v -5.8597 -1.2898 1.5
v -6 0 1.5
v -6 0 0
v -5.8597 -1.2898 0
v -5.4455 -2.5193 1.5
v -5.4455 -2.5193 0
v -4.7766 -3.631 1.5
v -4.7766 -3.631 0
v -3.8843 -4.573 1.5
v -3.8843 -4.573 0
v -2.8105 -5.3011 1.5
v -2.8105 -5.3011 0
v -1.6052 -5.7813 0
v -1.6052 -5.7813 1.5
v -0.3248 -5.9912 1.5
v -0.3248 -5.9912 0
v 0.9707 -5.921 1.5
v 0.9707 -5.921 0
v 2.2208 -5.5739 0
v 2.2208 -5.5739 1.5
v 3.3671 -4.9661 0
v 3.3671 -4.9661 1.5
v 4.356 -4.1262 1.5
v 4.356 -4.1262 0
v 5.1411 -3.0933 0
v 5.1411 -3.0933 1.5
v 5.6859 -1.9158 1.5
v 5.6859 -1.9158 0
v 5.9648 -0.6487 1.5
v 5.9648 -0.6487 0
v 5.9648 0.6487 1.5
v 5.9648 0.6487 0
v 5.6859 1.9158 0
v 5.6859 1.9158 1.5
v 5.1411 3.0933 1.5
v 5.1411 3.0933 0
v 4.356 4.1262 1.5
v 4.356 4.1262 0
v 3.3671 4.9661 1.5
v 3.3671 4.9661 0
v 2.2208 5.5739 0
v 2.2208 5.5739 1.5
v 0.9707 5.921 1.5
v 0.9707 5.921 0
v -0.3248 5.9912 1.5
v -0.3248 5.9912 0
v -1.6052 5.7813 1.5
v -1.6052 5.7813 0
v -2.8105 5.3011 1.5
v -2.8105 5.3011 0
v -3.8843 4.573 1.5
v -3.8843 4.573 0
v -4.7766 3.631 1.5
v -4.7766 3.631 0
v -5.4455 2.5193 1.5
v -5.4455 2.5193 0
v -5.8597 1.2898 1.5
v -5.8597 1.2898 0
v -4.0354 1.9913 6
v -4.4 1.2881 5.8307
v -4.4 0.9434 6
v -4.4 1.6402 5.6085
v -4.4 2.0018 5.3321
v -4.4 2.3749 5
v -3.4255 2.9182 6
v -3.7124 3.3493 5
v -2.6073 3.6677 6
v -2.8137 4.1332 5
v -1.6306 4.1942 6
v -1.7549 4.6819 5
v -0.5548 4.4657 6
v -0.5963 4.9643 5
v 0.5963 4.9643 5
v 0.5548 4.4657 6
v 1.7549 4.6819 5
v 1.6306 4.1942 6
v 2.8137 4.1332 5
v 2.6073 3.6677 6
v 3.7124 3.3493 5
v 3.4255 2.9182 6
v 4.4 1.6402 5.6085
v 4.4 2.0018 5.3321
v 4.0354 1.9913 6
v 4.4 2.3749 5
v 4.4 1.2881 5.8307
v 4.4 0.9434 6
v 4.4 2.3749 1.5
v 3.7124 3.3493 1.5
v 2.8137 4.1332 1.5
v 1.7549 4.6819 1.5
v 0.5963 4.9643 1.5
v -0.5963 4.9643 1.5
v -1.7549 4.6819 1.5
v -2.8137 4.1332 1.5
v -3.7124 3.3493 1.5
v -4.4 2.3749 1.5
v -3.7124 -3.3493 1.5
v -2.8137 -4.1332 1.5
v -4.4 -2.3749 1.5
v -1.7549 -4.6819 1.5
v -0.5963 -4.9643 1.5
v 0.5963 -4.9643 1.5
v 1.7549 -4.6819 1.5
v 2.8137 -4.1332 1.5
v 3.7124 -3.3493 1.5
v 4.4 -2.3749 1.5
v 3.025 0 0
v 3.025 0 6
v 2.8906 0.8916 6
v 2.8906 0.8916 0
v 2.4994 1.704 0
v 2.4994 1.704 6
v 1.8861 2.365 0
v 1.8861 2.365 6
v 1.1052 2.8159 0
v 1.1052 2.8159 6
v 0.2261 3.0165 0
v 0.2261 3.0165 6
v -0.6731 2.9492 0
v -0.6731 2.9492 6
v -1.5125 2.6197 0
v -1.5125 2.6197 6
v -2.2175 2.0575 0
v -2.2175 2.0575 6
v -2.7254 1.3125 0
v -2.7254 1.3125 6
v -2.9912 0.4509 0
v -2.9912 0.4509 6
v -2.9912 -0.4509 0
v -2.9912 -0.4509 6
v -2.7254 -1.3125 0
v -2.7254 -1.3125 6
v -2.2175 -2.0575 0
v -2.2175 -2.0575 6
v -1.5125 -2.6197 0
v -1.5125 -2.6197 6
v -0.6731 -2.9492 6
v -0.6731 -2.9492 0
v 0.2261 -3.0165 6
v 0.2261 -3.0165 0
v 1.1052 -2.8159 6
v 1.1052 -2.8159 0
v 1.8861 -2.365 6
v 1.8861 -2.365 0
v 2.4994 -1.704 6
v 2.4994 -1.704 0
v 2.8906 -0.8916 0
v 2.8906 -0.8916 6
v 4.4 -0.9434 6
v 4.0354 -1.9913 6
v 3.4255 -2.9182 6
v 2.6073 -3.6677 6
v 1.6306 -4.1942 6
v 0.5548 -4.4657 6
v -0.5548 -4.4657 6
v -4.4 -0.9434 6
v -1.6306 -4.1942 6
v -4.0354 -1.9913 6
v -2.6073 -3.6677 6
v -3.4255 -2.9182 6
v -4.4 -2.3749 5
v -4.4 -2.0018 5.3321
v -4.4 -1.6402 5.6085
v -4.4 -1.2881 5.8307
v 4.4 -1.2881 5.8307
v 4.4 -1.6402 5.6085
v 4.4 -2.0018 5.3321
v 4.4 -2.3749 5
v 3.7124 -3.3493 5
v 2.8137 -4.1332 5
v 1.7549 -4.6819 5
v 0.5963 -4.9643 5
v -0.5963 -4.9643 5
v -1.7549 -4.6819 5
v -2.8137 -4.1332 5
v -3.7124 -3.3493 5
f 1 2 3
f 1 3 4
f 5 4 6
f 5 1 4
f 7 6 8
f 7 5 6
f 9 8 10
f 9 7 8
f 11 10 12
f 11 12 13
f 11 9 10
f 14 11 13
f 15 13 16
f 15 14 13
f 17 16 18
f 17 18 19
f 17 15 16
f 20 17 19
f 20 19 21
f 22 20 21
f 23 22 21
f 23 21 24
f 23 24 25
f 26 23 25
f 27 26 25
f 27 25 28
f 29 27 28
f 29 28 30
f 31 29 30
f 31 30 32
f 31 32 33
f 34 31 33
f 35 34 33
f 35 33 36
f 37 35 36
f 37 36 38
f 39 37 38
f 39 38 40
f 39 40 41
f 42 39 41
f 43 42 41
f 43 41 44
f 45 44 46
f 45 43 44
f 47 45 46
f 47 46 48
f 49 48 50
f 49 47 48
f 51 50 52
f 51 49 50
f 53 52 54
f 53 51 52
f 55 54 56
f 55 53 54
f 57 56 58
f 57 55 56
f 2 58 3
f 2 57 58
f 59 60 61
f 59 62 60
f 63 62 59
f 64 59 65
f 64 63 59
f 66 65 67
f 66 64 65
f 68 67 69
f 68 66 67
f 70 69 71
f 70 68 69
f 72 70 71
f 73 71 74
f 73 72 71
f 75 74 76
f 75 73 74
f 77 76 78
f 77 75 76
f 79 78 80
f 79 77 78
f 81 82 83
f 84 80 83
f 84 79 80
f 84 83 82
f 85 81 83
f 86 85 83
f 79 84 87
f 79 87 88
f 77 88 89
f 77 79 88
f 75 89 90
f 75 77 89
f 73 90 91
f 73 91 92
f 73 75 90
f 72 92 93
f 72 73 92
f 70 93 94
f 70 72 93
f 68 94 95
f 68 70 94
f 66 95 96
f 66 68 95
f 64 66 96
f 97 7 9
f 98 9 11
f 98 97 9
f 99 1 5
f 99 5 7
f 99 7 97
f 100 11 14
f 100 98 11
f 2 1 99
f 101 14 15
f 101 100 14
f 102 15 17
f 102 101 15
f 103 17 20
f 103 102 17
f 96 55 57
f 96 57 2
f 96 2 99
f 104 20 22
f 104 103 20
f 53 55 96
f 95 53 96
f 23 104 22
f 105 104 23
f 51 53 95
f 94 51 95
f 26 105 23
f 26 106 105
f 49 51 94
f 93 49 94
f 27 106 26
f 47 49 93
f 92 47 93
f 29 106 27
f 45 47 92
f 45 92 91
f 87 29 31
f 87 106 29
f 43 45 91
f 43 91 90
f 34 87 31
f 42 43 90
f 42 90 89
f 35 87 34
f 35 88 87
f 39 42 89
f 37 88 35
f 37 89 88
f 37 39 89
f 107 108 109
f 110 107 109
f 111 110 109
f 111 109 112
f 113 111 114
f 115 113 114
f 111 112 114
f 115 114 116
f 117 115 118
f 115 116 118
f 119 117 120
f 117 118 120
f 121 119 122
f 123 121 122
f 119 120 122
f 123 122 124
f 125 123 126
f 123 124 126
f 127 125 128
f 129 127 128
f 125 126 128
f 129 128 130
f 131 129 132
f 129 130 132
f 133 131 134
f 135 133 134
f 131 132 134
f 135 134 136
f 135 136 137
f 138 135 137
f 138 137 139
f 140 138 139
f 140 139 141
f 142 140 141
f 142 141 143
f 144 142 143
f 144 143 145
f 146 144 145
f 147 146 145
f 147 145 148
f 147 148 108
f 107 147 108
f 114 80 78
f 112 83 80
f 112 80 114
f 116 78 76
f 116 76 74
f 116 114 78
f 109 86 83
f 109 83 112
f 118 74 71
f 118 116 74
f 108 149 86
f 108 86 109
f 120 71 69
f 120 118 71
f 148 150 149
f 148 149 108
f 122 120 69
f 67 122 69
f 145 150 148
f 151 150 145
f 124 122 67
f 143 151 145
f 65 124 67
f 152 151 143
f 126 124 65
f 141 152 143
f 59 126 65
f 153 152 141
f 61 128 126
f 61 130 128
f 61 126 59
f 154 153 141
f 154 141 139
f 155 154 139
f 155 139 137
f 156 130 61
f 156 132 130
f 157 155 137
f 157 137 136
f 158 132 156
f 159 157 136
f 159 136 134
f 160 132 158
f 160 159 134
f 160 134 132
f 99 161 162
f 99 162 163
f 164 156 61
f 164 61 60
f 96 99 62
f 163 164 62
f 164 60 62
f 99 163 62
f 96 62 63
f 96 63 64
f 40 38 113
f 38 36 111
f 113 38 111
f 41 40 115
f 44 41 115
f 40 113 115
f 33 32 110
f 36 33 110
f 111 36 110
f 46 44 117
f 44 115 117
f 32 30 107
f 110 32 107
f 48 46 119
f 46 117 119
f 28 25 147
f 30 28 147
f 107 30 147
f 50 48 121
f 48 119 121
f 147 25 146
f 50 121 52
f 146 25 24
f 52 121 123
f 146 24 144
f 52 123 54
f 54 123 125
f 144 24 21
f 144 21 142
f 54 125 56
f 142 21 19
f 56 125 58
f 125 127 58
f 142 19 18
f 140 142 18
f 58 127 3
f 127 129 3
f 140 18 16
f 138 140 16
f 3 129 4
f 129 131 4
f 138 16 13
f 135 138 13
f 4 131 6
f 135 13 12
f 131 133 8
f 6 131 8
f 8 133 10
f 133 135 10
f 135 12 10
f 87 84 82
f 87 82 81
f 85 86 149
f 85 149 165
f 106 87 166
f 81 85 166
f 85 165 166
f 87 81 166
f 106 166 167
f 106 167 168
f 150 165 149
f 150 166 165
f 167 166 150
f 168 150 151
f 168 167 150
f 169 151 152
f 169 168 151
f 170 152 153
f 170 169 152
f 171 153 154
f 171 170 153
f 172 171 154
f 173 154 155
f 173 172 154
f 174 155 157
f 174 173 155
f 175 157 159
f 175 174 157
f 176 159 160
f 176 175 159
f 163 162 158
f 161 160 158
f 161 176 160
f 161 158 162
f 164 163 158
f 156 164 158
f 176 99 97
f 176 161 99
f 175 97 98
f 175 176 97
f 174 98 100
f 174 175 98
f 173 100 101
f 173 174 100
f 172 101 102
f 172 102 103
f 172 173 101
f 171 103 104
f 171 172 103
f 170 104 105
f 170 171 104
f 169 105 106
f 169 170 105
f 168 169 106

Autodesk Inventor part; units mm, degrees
ref_plane "YZ Plane" through (0, 0, 0) normal (1, 0, 0) x (0, 1, 0)
ref_plane "XZ Plane" through (0, 0, 0) normal (0, 1, 0) x (-1, 0, 0)
ref_plane "XY Plane" through (0, 0, 0) normal (0, 0, 1) x (1, 0, 0)
sketch "スケッチ1" plane through (0, 0, 0) normal (0, 1, 0) x (-1, 0, 0)
  line L0 (3, 0) -> (6, 0)
  line L1 (6, 0) -> (6, 1.5)
  line L2 (6, 1.5) -> (5, 1.5)
  line L3 (5, 1.5) -> (5, 5)
  line L4 (4.5, 6) -> (3, 6)
  line L5 (3, 6) -> (3, 0)
  line L6 (5, 5) -> (4.5, 6)
  line L7 (0, -1.2) -> (0, 7.2) projected
  point P0 (0, 0)
  point P1 (3, 6)
  dimension "d5" = 1.5
  dimension "d9" = 1
  dimension "d10" = 0.5
  dimension "d17" = 10
  dimension "d18" = 12
  dimension "d19" = 6
  dimension "d20" = 6
revolve "回転1" add sketch "スケッチ1" angle 360 about axis through (0, 0, -10) along (0, 0, 1)
sketch "スケッチ2" plane through (0, 0, 6) normal (0, 0, 1) x (1, 0, 0)
  line L0 (4.4, -2.3749) -> (-4.4, -2.3749)
  line L1 (-4.4, -2.3749) -> (-4.4, 2.3749)
  line L2 (-4.4, 2.3749) -> (4.4, 2.3749)
  line L3 (4.4, 2.3749) -> (4.4, -2.3749)
  line L4 (4.4, -2.3749) -> (-4.4, 2.3749) construction
  line L5 (-4.4, -2.3749) -> (4.4, 2.3749) construction
  circle A0 centre (0, 0) radius 5
  point P0 (0, 0)
  dimension "d12" = 10
  dimension "d11" = 8.8
extrude "押し出し1" cut sketch "スケッチ2" against normal up to surface (4.5 mm away) contours L3 A0 | A0 L1
sketch "스케치3" plane through (0, 0, 6) normal (0, 0, 1) x (1, 0, 0)
  circle A0 centre (0, 0) radius 3 projected
  line L0 (4.4, -0.9434) -> (4.4, 0.9434) projected
  arc A1 (4.4, 0.9434) -> (-4.4, 0.9434) centre (0, 0) ccw projected
  line L1 (-4.4, 0.9434) -> (-4.4, -0.9434) projected
  arc A2 (-4.4, -0.9434) -> (4.4, -0.9434) centre (0, 0) ccw projected
  circle A3 centre (0, 0) radius 3.025
  dimension "d21" = 6.05
extrude "돌출2" cut sketch "스케치3" against normal up to surface (6 mm away) contours A0 | A3
properties part number "LED-0606" material "アセタール樹脂、黒"
